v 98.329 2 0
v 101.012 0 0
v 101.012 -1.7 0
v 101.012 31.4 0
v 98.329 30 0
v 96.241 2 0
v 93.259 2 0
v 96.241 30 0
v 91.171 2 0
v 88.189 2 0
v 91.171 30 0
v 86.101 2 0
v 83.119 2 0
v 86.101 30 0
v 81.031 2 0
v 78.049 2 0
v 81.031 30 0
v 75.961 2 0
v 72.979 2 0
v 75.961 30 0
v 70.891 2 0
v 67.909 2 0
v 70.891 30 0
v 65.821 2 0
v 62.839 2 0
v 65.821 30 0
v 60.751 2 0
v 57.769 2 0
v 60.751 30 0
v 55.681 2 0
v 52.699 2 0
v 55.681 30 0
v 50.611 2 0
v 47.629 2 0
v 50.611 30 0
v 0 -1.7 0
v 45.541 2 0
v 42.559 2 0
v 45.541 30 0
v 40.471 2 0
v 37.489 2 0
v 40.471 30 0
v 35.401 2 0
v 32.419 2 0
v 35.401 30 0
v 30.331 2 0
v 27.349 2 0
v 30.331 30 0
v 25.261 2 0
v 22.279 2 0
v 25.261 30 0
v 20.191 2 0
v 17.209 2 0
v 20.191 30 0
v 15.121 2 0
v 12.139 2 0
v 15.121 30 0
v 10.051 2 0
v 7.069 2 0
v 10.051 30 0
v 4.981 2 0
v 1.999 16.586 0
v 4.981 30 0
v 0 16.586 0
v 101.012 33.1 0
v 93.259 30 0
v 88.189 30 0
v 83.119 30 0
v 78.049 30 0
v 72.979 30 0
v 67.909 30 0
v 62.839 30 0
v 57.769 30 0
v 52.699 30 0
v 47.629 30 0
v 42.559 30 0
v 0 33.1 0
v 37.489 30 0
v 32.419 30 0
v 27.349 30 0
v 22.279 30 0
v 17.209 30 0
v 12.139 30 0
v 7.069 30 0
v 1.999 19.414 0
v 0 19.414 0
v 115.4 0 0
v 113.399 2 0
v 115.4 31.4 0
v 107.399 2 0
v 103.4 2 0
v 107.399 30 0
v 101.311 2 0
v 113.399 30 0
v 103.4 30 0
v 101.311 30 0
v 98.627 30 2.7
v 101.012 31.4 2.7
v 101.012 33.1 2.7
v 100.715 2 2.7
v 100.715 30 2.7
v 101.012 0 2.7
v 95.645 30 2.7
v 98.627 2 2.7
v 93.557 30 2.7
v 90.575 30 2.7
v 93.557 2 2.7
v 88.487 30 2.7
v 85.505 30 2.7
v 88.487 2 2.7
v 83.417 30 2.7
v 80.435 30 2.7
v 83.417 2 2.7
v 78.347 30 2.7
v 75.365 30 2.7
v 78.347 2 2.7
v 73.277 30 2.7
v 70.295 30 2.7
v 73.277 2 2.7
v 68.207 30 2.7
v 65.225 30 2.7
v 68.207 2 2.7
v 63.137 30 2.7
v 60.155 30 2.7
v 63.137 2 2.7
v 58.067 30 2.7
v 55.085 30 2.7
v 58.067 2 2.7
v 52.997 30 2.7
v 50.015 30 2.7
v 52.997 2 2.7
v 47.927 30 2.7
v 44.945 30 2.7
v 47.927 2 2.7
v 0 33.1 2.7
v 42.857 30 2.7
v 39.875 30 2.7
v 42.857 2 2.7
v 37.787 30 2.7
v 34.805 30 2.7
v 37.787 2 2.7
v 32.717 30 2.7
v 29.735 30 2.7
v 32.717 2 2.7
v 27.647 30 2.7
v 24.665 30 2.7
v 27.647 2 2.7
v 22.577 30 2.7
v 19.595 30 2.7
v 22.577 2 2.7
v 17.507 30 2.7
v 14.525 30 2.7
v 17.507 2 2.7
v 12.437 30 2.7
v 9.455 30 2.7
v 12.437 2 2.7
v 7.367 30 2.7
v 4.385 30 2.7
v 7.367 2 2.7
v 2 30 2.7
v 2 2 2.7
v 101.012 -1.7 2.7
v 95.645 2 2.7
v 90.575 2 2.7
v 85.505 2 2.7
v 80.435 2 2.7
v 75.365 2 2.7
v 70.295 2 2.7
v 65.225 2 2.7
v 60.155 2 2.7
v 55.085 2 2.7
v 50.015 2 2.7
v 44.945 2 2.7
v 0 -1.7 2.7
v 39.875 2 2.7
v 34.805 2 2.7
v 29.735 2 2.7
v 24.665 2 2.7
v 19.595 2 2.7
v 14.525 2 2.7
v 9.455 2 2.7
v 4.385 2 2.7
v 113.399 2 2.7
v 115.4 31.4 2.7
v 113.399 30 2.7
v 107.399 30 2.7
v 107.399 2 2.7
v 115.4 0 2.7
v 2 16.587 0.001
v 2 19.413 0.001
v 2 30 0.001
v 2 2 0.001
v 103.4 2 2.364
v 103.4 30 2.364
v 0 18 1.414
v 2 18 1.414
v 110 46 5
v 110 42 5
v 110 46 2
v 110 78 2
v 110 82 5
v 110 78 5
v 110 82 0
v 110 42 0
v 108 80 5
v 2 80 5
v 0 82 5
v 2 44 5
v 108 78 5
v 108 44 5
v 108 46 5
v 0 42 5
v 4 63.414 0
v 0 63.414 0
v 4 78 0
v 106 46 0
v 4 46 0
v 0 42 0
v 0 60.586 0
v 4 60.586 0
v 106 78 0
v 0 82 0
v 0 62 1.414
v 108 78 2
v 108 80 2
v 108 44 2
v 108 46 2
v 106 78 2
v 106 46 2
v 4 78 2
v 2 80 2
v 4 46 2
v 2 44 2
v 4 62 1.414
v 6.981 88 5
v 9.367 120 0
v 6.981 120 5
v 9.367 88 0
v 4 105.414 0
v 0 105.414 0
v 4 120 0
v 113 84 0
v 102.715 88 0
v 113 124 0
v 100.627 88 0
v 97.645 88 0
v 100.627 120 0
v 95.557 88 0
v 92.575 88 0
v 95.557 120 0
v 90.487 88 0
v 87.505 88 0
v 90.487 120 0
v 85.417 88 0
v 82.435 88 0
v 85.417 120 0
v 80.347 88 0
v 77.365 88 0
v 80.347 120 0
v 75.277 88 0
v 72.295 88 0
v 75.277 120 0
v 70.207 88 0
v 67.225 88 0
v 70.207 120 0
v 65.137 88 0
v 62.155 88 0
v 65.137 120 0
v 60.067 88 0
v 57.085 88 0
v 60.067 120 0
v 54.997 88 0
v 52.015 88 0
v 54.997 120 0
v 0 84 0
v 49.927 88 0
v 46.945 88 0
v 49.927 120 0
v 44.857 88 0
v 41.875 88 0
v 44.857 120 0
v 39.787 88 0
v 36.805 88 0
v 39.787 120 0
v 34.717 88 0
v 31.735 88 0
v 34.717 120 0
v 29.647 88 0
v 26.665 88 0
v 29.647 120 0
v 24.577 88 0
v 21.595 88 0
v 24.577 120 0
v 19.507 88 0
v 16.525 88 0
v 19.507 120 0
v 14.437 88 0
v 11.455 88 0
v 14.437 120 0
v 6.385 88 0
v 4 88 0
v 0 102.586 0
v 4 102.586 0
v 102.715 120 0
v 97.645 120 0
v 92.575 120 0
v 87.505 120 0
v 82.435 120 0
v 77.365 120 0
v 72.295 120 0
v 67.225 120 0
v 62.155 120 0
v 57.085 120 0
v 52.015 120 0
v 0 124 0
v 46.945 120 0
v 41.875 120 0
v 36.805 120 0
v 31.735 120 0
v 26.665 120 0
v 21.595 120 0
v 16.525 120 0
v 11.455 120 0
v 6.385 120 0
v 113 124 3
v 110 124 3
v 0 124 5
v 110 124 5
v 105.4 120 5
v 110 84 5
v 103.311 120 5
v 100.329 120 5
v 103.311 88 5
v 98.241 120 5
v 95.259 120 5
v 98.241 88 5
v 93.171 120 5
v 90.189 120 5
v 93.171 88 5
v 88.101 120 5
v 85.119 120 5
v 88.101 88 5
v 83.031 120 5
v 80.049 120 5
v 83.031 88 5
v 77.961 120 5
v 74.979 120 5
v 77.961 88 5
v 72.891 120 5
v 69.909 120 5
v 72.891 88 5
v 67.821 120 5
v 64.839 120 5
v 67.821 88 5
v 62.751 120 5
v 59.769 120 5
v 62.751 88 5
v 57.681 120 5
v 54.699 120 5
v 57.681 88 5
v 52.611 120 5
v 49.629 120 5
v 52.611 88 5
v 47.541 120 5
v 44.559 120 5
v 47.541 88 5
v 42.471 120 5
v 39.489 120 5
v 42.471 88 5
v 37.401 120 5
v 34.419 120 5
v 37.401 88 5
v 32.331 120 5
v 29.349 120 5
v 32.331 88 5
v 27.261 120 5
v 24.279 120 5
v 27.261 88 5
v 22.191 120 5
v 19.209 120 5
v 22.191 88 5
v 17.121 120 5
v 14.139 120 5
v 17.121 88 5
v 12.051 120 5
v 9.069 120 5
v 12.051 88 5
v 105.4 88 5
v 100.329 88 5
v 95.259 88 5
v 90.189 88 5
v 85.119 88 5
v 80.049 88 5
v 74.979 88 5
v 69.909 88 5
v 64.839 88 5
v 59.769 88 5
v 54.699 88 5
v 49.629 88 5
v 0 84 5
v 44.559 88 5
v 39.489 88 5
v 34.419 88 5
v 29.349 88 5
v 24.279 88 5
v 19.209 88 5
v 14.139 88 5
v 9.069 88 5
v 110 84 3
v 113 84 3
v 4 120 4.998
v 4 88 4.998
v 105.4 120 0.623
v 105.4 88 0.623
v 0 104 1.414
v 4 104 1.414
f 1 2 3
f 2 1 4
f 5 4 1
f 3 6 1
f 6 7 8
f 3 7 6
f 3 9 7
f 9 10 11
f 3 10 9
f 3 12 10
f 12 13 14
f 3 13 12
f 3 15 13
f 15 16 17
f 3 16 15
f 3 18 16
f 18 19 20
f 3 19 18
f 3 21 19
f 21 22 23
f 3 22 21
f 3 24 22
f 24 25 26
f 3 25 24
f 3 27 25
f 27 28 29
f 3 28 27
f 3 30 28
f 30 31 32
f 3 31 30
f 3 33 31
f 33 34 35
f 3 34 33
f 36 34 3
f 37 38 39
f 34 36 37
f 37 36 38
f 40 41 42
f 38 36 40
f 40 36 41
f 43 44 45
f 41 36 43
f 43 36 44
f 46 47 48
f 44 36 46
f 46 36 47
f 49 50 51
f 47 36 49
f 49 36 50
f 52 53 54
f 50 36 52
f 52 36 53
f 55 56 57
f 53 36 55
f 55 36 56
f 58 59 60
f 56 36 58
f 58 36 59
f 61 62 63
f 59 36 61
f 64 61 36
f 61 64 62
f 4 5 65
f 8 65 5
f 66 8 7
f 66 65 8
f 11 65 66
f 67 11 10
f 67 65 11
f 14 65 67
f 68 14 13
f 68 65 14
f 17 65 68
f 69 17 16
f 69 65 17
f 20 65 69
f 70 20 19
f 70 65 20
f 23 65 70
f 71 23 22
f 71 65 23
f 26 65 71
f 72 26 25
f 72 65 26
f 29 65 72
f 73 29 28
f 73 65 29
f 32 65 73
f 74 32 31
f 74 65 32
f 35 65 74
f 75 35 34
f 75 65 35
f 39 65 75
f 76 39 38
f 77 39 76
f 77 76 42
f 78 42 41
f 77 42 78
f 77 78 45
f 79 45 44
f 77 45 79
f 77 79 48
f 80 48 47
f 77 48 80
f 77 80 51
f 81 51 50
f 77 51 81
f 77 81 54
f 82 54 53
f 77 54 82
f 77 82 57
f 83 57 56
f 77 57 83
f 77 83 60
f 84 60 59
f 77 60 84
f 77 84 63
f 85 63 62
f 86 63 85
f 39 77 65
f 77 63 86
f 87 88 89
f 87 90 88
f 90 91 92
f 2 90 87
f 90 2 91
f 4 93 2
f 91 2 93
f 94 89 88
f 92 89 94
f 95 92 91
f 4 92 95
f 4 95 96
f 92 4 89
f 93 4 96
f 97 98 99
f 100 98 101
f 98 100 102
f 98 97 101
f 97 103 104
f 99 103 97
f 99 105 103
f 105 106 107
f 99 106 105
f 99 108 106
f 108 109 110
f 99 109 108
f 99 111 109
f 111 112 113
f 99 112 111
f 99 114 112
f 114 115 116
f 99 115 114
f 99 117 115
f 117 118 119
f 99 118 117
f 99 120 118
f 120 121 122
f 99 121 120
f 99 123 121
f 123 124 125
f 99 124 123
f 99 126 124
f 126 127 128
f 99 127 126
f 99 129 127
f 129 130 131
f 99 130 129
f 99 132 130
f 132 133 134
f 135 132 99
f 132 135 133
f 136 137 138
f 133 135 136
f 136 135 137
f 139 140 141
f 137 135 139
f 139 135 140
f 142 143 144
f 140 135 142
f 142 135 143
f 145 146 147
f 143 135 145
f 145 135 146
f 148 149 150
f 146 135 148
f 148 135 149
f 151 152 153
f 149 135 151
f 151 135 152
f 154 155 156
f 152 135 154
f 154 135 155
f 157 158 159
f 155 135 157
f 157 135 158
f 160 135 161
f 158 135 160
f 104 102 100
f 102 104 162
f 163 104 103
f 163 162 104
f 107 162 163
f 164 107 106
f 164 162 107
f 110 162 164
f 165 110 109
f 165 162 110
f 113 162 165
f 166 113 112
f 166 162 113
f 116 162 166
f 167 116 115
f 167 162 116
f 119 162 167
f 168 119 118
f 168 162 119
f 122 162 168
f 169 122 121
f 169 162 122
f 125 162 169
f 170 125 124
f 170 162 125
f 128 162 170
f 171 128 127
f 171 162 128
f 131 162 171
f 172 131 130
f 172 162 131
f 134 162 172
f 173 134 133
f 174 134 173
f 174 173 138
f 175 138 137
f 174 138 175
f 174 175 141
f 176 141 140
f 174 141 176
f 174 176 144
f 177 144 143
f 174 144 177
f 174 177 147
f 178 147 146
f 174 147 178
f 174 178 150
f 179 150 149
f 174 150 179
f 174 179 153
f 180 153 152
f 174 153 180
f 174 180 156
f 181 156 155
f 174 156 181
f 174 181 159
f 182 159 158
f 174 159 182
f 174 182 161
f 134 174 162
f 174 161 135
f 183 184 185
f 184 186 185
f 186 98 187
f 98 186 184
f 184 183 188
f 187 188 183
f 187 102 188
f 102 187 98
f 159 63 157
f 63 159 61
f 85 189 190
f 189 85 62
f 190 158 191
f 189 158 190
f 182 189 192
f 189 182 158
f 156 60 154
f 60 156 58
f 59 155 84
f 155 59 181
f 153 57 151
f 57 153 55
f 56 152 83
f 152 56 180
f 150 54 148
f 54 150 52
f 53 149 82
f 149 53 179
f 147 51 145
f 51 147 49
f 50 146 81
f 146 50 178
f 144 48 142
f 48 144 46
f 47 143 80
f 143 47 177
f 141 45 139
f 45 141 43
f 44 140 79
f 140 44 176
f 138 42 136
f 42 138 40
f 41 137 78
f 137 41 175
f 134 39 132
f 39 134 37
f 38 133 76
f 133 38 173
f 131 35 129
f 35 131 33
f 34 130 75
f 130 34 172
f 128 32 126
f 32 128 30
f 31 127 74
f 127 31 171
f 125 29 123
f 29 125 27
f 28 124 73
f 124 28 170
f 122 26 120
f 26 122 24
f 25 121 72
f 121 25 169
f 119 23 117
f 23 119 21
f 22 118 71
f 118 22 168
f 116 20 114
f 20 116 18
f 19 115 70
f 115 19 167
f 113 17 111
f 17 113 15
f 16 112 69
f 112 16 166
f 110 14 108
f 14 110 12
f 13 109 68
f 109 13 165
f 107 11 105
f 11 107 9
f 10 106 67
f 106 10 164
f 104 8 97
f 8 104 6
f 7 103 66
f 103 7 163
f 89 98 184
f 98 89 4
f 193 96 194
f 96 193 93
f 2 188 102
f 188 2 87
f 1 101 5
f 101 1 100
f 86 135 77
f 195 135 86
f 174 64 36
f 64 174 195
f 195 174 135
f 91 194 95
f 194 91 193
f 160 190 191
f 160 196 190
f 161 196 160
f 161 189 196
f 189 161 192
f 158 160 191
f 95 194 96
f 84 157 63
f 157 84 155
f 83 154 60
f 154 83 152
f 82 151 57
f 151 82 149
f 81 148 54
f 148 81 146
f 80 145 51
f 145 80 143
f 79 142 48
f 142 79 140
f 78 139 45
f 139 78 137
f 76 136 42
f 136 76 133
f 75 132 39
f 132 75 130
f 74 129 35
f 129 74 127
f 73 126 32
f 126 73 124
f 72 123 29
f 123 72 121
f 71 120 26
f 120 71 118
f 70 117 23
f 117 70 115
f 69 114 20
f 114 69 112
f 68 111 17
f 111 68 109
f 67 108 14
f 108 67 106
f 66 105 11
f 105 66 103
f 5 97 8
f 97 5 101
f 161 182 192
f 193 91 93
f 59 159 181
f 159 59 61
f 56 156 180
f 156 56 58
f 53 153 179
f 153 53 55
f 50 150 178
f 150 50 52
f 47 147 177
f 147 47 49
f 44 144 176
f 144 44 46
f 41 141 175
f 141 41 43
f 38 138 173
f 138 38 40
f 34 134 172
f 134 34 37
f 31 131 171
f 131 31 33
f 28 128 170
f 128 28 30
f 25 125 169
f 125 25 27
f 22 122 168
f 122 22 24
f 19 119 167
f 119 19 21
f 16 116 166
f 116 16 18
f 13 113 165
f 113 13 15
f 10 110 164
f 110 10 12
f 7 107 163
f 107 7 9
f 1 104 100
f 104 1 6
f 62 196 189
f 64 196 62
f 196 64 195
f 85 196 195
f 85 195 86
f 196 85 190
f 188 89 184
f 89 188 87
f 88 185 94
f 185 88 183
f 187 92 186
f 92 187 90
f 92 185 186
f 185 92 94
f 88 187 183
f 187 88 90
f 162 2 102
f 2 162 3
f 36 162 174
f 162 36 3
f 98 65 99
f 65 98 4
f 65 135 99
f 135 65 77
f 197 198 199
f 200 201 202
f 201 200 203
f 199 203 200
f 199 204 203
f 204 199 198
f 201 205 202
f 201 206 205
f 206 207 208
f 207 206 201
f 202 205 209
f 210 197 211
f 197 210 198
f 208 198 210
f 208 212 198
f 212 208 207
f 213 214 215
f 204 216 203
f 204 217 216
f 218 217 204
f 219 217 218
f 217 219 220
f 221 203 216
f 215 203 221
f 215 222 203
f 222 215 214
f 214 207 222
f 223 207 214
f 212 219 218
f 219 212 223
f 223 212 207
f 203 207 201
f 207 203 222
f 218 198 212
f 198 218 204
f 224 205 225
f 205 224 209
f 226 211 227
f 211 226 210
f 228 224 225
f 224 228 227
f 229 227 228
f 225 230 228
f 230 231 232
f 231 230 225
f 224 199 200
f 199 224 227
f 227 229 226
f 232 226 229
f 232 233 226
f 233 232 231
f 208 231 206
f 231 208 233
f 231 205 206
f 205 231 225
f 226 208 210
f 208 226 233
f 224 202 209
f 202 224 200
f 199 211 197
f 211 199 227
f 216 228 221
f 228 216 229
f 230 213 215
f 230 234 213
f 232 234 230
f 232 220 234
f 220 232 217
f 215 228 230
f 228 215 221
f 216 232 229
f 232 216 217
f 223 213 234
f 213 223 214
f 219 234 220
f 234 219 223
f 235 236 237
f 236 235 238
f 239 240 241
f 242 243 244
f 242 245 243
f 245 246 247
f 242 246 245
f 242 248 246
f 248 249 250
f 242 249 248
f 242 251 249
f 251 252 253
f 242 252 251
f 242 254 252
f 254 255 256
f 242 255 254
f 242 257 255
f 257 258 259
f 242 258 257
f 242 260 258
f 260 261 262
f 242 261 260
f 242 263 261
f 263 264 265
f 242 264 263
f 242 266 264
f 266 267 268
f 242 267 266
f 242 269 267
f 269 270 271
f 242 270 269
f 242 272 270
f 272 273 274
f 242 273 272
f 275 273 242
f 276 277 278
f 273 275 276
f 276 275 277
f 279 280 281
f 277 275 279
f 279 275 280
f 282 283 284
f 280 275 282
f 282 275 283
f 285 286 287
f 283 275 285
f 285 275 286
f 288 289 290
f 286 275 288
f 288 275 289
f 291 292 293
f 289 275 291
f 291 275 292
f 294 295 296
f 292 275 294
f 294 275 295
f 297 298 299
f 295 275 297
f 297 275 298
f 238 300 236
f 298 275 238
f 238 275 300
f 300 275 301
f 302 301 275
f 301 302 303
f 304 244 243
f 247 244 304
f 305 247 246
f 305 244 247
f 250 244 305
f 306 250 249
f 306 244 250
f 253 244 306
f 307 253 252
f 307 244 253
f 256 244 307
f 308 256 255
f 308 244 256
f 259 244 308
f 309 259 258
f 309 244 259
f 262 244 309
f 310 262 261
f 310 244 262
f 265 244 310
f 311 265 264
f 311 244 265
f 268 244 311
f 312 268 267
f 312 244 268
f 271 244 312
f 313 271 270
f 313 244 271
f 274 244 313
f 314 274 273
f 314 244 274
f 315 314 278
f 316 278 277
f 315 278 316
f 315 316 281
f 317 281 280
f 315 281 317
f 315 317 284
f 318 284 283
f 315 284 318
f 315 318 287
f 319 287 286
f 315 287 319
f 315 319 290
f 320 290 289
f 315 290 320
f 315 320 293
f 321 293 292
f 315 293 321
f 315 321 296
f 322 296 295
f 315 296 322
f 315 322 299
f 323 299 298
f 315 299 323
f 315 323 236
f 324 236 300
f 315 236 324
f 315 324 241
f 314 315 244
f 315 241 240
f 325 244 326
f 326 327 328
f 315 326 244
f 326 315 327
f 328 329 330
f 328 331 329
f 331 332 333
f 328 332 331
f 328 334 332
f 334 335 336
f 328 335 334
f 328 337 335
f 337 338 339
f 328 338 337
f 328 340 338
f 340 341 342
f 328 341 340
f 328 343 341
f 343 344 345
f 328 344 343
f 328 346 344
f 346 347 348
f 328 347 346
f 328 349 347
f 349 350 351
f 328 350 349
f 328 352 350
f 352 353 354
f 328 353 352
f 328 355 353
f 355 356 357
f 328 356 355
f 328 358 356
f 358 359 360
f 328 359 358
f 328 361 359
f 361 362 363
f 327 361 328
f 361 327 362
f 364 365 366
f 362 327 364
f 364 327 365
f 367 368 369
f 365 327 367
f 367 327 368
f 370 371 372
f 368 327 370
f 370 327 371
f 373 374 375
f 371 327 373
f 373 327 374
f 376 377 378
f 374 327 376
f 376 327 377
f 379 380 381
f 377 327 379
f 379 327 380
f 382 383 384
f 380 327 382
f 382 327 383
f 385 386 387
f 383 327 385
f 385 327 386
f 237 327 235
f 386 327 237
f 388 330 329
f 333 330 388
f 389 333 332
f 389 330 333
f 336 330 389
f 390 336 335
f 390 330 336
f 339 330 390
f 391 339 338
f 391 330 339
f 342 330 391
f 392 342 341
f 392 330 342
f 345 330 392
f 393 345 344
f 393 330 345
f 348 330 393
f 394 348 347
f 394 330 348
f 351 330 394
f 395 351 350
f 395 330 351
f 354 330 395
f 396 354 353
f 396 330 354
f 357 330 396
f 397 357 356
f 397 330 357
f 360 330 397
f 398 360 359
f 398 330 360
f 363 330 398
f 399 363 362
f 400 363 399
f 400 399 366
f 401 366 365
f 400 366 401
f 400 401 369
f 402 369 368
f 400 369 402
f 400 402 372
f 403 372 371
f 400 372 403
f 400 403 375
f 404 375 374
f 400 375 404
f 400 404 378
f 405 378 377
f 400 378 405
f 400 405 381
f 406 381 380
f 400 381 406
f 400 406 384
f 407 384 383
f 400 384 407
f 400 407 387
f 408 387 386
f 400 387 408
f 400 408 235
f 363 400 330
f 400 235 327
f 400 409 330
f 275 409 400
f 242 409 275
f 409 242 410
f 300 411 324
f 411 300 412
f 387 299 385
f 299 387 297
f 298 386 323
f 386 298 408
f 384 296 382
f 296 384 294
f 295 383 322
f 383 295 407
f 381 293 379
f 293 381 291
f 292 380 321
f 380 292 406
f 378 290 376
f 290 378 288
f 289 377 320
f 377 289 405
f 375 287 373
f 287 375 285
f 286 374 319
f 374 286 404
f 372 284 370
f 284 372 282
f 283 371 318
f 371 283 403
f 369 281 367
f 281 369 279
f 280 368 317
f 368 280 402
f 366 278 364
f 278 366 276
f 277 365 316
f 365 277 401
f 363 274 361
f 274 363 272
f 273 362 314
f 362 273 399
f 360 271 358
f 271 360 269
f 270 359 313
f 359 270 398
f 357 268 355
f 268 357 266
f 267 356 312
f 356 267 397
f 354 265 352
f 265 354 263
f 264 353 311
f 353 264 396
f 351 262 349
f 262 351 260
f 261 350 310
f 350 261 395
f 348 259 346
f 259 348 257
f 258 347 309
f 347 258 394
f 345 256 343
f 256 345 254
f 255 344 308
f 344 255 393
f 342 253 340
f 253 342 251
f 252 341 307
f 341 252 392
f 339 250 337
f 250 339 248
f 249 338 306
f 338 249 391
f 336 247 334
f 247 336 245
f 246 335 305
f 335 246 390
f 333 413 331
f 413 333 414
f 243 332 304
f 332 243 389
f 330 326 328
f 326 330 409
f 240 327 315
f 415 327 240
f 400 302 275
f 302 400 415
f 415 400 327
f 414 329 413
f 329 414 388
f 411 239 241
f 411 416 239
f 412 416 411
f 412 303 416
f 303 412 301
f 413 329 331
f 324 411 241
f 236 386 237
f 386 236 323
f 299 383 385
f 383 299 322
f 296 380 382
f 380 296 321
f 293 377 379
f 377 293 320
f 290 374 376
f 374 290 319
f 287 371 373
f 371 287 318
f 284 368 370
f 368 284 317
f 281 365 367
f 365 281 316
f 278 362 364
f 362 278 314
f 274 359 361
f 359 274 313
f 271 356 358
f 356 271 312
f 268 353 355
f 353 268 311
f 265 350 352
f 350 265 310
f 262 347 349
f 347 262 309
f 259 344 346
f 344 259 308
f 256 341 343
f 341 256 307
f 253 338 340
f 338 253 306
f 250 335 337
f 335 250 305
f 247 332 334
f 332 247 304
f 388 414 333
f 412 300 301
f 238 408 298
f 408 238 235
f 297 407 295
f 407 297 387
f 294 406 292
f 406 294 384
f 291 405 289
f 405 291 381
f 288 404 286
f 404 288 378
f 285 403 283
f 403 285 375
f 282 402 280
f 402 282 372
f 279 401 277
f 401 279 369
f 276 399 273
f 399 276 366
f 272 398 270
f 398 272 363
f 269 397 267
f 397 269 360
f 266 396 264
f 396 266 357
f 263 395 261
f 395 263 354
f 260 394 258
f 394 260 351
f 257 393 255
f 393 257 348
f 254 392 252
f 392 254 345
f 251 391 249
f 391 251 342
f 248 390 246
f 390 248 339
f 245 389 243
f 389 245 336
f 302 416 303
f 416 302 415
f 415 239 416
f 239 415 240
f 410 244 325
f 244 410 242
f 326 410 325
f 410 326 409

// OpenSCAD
nVanes = 20;
VentWidth = 110;
VentLength = 40;
VentHeight1 = 5;
VentGuide = 2;
VentFrame = 2;
VentSpace = .7;
VentSkew = .8;
FitTol = 0.3;
SlideTol = 0.3;
PerspexWidth = 3;
SmallNum = 0.001;
HandleWidth = 10;
Frame = VentFrame;

module Vane(Width, Length, Height, Skew){


polyhedron(
	points=	[	[0,0,0],							// 0
					[Width,0,0], 					// 1
					[Width, Length,0],			// 2
					[0, Length, 0],				// 3
					[Skew, 0, Height],			// 4
					[Skew+Width, 0, Height],	// 5
					[Skew+Width, Length, Height], //6
					[Skew, Length, Height]			//7
				],
	faces=	[	[1,2,3,0], //A
					[5,6,2,1], //B
					[6,7,3,2], //C
					[7,4,0,3], // D
					[4,5,1,0], // E
					[7,6,5,4]  // F
					
				]
				);
};

module Chamfer(Width, Length, Height){
	polyhedron(
		points = 	[
							[0,0,0], 		//0
							[Width, 0,0],	//1
							[Width, Length, 0,],	//2
							[0, Length, 0],		//3
							[0,0,Height],
							[Width, 0, Height]
						],

		faces =		[
							[0,1,2,3],		//A
							[1,5,2],			//B
							[4,0,3],			//C
							[5,4,3,2],		//D
							[4,5,1,0]
						]
					);


};


module Slider(nVanes, Width, Length, Height, Frame, HandleWidth, GuideWidth){
	VaneWidth = (Width-Frame*2)/(nVanes*(1+VentSpace));
union(){
//			echo("Slider VaneWidth", VaneWidth);
		//VANES
		for(i = [0:(nVanes-1)]){
			translate([VaneWidth*(1+VentSpace)*(i)+Frame-SmallNum,0,0]) Vane(VaneWidth, Length-SlideTol*2-GuideWidth*2, Height, VaneWidth*VentSkew);
		}; //End For
		//FRAME
		difference(){
			cube([Width, Length-SlideTol*2-GuideWidth*2, Height]);
			translate([Frame, Frame,-SmallNum]) cube([(Width-Frame*2), (Length-Frame*2-GuideWidth*2), Height+SmallNum*2]);
		//Removal key
		translate([0,Length/2,0]) rotate([45,0,0]) translate([-1,-1,-1]) cube([5,2,2]);

		}; //End Difference
		//HANDLE
		translate([Width-SmallNum,0,0]) difference(){
			cube([HandleWidth+SmallNum, Length-SlideTol*2-GuideWidth*2, Height]);
			translate([Frame, Frame, -SmallNum]) cube([(HandleWidth-Frame*2), (Length-Frame*2-GuideWidth*2), Height+SmallNum*2]);
			echo("Slider HandleWidth", Length-SlideTol*2-GuideWidth*2);
		}; //End Diffference 
		//SLIDEGUIDE
		translate([0,-GuideWidth+SlideTol, 0]) cube([Width-Frame-VaneWidth*VentSpace-FitTol,GuideWidth-SlideTol, Height]);
		translate([0,Length-SlideTol*2-GuideWidth*2, 0]) cube([Width-Frame-VaneWidth*VentSpace-FitTol,GuideWidth-SlideTol, Height]);
	};
};

module SlideBox(nVanes, Width, Length, Height, Frame, GuideWidth){
	VaneWidth = (VentWidth-Frame*4-FitTol*2)/(nVanes*(1+VentSpace));
union(){
	difference(){
		cube([Width, Length, Height]);
		translate([Frame, Frame, Frame]) cube([Width-Frame*2, Length-Frame*2, Height-Frame]); //Main Slidey Area
		/*translate([Width-Frame-VaneWidth*VentSpace, Frame+GuideWidth, Frame]) cube([VaneWidth, Length-(GuideWidth+Frame)*2, Height-Frame]); //SlideStopperArea*/
		echo("SlideBox VaneWidth", VaneWidth); //SlideStopperArea
		translate([Frame,Frame+GuideWidth,Frame]) cube([Width-Frame,Length-(Frame+GuideWidth)*2, Height-Frame]);
//	echo("SlideBox HandleWidth", Length-(Frame+GuideWidth)*2); //SlideStopperArea
		translate([Frame*2, Frame*2, 0]) cube([Width-Frame*4,Length-Frame*4,Frame]);
		//Removal key
		translate([0,Length/2,0]) rotate([45,0,0]) translate([-1,-1,-1]) cube([5,2,2]);

	}; //End difference
	};
};

module VentTopBox(nVanes, Width, Length, Height, Frame, GuideWidth){
	VaneWidth = (VentWidth-Frame*4-FitTol*2)/(nVanes*(1+VentSpace));
union(){
			//VANES
		translate([Frame,0,0])
			for(i = [0:(nVanes-1)]){
				translate([VaneWidth*(1+VentSpace)*(i)+Frame+VaneWidth*VentSkew-SmallNum,0,0]) Vane(VaneWidth, Length, Height, -VaneWidth*VentSkew);
			}; //End For
		difference(){
			cube([Width, Length, Height]);
	/*		translate([Frame, Frame, Frame]) cube([Width-Frame*2, Length-Frame*2, Height-Frame]); //Main Slidey Area
	*/
//			echo("SlideBox VaneWidth", VaneWidth); //SlideStopperArea
			translate([Frame*2, Frame*2, -SmallNum]) cube([Width-Frame*4-FitTol*2,Length-Frame*4,Height+SmallNum*2]); //Hole
		//Removal key
		translate([0,Length/2,0]) rotate([45,0,0]) translate([-1,-1,-1]) cube([5,2,2]);

		}; //End difference
		translate([Width-SmallNum,0,0]) cube([PerspexWidth+SmallNum, Length,PerspexWidth]);
	};
};




Slider(nVanes, VentWidth-VentFrame*2-FitTol*2, VentLength-VentFrame*2, VentHeight1-FitTol-VentFrame, VentFrame, HandleWidth, VentGuide);

translate([0,VentLength+2,0]) SlideBox(nVanes,VentWidth, VentLength, VentHeight1, VentFrame,VentGuide);

translate([0,(VentLength+2)*2,0]) VentTopBox(nVanes,VentWidth, VentLength, VentHeight1, VentFrame,VentGuide);

//translate([0,50,0]) Chamfer(100,5,20);

//translate(20,0,0) Vane(5, 30, 10, 2.5);
